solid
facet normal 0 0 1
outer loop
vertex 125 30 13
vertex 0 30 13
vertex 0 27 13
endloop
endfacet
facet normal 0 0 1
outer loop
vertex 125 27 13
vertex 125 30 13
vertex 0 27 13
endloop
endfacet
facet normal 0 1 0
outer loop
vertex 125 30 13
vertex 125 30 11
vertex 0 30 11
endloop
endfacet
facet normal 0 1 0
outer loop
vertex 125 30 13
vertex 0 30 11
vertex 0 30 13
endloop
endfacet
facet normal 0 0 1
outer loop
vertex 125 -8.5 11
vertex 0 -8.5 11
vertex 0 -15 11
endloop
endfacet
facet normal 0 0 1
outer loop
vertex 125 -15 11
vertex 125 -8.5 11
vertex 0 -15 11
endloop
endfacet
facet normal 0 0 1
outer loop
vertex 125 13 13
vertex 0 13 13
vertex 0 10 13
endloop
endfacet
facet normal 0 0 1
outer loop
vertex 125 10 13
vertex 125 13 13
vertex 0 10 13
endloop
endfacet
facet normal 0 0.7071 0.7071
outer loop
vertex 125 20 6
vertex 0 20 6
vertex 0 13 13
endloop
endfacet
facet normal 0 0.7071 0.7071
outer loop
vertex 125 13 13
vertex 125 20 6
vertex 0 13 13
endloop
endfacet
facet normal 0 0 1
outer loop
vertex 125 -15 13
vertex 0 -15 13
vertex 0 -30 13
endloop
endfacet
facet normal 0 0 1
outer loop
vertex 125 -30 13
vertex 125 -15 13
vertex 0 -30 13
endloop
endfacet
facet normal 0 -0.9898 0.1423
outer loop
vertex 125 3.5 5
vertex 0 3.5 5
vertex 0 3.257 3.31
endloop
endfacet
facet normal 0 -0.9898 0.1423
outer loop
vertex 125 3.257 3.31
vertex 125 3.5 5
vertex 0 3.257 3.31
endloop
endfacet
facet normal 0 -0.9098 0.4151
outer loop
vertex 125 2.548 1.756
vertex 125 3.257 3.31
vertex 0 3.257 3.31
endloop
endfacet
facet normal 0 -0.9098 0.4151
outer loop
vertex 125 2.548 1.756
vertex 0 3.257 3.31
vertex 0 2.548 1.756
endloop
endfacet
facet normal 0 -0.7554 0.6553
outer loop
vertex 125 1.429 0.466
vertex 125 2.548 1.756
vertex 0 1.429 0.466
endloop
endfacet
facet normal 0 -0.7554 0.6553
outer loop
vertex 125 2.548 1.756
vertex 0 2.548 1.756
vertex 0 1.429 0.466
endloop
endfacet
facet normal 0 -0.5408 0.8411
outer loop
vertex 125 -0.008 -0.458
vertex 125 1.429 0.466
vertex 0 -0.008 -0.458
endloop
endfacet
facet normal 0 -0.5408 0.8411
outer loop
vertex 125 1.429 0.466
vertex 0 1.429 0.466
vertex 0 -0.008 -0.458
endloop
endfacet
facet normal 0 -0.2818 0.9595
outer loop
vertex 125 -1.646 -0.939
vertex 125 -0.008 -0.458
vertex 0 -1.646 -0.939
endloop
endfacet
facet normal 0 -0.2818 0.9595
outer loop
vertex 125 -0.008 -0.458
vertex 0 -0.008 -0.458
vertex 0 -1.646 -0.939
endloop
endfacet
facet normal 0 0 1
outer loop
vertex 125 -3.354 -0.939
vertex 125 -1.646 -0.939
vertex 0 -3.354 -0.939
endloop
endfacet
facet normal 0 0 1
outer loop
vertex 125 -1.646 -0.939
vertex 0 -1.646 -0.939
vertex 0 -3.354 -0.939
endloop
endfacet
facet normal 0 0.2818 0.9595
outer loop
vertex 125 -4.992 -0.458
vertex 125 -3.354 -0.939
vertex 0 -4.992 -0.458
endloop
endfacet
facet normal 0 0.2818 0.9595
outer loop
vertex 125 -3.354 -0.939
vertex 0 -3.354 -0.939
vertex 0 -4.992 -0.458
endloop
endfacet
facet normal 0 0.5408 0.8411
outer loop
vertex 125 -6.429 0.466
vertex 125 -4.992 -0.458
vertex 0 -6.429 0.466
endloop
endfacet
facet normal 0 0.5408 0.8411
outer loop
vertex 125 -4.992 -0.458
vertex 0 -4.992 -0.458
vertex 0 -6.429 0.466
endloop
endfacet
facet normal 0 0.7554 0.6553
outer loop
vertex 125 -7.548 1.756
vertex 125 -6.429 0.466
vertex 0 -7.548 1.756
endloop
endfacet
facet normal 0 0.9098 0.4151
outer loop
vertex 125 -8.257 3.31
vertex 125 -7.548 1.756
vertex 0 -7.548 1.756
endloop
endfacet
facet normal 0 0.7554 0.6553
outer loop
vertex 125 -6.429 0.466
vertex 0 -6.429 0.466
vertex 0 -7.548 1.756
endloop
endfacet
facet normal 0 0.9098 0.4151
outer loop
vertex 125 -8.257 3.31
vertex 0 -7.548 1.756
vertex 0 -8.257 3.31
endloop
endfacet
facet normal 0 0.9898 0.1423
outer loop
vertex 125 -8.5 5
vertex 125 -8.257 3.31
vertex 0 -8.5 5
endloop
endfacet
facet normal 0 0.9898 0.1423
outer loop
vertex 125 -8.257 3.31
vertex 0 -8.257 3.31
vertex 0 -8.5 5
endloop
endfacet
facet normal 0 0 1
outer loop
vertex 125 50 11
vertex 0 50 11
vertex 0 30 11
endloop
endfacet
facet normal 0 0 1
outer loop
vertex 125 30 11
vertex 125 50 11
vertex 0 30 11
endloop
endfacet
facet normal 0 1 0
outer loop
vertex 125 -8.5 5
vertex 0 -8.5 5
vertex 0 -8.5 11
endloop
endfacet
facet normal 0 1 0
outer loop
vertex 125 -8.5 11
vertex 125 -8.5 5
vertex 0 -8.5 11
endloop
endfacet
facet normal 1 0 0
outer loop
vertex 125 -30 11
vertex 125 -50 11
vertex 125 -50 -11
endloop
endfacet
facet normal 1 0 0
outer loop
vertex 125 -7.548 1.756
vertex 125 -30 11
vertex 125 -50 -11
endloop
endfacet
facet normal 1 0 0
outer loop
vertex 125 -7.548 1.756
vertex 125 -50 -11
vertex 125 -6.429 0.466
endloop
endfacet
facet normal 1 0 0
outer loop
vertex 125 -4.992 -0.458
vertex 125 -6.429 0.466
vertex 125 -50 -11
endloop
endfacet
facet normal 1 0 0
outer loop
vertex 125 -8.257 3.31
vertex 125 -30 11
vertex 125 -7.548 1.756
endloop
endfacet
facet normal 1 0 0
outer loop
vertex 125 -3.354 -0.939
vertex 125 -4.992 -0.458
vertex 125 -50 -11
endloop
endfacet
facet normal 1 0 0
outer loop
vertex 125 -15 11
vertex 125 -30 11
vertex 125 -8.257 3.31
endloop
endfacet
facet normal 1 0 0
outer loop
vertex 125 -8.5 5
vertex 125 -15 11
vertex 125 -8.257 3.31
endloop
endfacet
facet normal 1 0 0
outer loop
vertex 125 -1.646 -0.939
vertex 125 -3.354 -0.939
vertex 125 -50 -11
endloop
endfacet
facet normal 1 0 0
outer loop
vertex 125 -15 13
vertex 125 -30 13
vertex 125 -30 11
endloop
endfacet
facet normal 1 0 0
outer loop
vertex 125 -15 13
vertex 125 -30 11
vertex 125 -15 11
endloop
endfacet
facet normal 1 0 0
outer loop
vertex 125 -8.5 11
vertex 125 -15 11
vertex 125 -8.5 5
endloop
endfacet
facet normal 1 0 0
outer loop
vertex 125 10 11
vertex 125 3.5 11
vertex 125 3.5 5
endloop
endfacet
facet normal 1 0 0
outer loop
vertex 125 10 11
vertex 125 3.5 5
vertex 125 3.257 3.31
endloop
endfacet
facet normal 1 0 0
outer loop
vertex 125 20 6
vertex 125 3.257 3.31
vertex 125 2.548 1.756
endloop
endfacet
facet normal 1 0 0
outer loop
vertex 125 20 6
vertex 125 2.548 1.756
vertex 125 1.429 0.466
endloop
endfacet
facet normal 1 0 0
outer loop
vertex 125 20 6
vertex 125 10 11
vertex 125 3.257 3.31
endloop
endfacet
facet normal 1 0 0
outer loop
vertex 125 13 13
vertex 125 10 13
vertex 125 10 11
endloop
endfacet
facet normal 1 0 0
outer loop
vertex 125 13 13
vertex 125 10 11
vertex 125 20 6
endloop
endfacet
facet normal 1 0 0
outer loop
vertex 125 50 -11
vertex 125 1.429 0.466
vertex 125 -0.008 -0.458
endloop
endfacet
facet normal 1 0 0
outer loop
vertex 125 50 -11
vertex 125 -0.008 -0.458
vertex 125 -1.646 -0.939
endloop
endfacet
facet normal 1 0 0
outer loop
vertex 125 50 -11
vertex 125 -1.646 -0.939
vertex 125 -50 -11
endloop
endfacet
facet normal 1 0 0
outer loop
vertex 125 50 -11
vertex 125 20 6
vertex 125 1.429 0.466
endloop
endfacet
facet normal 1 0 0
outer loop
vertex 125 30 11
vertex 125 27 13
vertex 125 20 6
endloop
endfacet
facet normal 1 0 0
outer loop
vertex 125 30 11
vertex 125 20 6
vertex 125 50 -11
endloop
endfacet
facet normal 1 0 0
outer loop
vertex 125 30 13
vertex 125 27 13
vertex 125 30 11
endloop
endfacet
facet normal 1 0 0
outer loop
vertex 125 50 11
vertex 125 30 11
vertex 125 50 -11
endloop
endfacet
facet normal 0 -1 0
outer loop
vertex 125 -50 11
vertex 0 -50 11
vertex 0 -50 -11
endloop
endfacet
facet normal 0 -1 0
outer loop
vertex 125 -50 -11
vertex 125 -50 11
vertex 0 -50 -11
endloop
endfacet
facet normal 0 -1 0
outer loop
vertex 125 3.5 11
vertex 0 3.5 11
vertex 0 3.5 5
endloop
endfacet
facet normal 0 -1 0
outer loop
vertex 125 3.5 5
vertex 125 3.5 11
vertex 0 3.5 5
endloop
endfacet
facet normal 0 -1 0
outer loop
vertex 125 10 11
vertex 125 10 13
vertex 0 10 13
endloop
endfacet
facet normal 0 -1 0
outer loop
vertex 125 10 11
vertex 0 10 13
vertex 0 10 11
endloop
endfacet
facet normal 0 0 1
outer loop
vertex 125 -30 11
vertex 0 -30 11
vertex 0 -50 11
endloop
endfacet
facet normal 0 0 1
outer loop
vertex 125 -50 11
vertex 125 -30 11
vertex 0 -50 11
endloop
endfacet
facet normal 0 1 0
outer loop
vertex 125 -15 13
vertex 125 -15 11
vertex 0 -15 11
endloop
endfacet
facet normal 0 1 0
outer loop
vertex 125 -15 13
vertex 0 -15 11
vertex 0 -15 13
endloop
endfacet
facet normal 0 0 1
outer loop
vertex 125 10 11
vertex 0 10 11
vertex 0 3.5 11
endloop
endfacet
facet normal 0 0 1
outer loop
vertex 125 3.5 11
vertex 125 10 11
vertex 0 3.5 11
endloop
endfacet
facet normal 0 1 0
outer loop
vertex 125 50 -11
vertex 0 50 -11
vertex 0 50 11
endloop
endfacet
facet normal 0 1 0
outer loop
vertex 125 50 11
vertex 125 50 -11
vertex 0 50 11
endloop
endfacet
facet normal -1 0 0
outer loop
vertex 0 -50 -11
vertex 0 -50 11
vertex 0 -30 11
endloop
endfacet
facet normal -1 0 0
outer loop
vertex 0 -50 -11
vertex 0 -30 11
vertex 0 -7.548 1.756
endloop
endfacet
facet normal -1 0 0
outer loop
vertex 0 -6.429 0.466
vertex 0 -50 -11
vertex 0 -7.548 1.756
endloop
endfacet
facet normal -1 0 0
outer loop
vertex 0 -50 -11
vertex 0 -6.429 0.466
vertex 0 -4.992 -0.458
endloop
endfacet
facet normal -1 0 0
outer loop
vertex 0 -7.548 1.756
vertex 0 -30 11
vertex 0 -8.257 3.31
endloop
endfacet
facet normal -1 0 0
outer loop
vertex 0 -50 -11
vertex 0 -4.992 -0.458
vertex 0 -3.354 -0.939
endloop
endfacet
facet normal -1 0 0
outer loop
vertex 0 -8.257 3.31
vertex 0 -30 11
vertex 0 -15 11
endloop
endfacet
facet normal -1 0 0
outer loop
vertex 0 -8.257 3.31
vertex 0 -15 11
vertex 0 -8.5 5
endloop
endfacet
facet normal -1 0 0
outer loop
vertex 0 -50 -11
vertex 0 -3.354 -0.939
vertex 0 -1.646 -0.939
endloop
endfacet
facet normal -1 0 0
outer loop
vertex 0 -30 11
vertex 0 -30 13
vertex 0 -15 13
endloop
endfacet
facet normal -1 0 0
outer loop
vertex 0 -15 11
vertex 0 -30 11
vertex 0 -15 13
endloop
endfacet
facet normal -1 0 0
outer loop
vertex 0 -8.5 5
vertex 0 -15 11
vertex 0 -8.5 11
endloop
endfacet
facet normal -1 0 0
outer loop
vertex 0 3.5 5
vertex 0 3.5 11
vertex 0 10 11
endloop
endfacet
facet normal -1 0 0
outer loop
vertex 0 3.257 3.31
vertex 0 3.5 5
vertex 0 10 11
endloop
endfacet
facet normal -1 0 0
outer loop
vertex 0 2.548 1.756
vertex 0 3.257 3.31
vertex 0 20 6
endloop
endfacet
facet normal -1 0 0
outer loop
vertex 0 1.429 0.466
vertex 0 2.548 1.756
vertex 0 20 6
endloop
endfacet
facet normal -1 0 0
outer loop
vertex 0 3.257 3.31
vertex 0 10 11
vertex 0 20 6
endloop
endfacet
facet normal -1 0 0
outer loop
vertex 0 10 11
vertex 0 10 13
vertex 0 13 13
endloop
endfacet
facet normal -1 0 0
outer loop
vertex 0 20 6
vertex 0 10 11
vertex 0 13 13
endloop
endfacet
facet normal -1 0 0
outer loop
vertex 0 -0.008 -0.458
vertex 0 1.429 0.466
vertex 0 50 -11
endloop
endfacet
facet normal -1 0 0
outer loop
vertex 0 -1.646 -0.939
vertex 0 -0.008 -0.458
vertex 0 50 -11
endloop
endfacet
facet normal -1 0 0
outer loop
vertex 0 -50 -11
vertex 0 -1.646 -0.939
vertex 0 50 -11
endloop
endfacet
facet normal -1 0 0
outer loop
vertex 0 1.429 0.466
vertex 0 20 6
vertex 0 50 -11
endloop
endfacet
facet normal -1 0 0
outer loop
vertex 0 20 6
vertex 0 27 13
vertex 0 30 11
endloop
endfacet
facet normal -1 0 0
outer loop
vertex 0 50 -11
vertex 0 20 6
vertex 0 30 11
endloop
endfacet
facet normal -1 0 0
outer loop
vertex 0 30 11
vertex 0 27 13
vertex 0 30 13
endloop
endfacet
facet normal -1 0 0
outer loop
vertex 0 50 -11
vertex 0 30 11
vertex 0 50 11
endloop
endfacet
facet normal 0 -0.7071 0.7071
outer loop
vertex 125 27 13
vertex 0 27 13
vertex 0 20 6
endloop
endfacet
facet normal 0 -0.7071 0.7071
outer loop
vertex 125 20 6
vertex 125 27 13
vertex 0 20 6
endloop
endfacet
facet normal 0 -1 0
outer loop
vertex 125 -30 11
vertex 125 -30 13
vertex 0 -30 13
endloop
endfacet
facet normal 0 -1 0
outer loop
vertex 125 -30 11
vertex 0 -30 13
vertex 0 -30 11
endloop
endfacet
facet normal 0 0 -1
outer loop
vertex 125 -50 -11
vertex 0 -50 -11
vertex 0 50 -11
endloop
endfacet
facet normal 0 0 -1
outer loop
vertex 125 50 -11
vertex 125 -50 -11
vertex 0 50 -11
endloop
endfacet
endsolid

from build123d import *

# Parameters (mm, degrees)
F1_DEPTH = 125


with BuildPart() as f1:
    # F0 (on Right) → F1 (new body)
    with BuildSketch(Plane.YZ):
        with BuildLine():
            Line((50, -11), (50, 11))
            Line((50, 11), (30, 11))
            Line((30, 11), (30, 13))
            Line((30, 13), (27, 13))
            Line((27, 13), (20, 6))
            Line((20, 6), (13, 13))
            Line((13, 13), (10, 13))
            Line((10, 13), (10, 11))
            Line((10, 11), (3.5, 11))
            Line((3.5, 11), (3.5, 5))
            ThreePointArc((3.5, 5), (-2.5, -1), (-8.5, 5))
            Line((-8.5, 5), (-8.5, 11))
            Line((-8.5, 11), (-15, 11))
            Line((-15, 11), (-15, 13))
            Line((-15, 13), (-30, 13))
            Line((-30, 13), (-30, 11))
            Line((-30, 11), (-50, 11))
            Line((-50, 11), (-50, -11))
            Line((-50, -11), (50, -11))
        make_face()
    extrude(amount=F1_DEPTH)


solid = f1.part
